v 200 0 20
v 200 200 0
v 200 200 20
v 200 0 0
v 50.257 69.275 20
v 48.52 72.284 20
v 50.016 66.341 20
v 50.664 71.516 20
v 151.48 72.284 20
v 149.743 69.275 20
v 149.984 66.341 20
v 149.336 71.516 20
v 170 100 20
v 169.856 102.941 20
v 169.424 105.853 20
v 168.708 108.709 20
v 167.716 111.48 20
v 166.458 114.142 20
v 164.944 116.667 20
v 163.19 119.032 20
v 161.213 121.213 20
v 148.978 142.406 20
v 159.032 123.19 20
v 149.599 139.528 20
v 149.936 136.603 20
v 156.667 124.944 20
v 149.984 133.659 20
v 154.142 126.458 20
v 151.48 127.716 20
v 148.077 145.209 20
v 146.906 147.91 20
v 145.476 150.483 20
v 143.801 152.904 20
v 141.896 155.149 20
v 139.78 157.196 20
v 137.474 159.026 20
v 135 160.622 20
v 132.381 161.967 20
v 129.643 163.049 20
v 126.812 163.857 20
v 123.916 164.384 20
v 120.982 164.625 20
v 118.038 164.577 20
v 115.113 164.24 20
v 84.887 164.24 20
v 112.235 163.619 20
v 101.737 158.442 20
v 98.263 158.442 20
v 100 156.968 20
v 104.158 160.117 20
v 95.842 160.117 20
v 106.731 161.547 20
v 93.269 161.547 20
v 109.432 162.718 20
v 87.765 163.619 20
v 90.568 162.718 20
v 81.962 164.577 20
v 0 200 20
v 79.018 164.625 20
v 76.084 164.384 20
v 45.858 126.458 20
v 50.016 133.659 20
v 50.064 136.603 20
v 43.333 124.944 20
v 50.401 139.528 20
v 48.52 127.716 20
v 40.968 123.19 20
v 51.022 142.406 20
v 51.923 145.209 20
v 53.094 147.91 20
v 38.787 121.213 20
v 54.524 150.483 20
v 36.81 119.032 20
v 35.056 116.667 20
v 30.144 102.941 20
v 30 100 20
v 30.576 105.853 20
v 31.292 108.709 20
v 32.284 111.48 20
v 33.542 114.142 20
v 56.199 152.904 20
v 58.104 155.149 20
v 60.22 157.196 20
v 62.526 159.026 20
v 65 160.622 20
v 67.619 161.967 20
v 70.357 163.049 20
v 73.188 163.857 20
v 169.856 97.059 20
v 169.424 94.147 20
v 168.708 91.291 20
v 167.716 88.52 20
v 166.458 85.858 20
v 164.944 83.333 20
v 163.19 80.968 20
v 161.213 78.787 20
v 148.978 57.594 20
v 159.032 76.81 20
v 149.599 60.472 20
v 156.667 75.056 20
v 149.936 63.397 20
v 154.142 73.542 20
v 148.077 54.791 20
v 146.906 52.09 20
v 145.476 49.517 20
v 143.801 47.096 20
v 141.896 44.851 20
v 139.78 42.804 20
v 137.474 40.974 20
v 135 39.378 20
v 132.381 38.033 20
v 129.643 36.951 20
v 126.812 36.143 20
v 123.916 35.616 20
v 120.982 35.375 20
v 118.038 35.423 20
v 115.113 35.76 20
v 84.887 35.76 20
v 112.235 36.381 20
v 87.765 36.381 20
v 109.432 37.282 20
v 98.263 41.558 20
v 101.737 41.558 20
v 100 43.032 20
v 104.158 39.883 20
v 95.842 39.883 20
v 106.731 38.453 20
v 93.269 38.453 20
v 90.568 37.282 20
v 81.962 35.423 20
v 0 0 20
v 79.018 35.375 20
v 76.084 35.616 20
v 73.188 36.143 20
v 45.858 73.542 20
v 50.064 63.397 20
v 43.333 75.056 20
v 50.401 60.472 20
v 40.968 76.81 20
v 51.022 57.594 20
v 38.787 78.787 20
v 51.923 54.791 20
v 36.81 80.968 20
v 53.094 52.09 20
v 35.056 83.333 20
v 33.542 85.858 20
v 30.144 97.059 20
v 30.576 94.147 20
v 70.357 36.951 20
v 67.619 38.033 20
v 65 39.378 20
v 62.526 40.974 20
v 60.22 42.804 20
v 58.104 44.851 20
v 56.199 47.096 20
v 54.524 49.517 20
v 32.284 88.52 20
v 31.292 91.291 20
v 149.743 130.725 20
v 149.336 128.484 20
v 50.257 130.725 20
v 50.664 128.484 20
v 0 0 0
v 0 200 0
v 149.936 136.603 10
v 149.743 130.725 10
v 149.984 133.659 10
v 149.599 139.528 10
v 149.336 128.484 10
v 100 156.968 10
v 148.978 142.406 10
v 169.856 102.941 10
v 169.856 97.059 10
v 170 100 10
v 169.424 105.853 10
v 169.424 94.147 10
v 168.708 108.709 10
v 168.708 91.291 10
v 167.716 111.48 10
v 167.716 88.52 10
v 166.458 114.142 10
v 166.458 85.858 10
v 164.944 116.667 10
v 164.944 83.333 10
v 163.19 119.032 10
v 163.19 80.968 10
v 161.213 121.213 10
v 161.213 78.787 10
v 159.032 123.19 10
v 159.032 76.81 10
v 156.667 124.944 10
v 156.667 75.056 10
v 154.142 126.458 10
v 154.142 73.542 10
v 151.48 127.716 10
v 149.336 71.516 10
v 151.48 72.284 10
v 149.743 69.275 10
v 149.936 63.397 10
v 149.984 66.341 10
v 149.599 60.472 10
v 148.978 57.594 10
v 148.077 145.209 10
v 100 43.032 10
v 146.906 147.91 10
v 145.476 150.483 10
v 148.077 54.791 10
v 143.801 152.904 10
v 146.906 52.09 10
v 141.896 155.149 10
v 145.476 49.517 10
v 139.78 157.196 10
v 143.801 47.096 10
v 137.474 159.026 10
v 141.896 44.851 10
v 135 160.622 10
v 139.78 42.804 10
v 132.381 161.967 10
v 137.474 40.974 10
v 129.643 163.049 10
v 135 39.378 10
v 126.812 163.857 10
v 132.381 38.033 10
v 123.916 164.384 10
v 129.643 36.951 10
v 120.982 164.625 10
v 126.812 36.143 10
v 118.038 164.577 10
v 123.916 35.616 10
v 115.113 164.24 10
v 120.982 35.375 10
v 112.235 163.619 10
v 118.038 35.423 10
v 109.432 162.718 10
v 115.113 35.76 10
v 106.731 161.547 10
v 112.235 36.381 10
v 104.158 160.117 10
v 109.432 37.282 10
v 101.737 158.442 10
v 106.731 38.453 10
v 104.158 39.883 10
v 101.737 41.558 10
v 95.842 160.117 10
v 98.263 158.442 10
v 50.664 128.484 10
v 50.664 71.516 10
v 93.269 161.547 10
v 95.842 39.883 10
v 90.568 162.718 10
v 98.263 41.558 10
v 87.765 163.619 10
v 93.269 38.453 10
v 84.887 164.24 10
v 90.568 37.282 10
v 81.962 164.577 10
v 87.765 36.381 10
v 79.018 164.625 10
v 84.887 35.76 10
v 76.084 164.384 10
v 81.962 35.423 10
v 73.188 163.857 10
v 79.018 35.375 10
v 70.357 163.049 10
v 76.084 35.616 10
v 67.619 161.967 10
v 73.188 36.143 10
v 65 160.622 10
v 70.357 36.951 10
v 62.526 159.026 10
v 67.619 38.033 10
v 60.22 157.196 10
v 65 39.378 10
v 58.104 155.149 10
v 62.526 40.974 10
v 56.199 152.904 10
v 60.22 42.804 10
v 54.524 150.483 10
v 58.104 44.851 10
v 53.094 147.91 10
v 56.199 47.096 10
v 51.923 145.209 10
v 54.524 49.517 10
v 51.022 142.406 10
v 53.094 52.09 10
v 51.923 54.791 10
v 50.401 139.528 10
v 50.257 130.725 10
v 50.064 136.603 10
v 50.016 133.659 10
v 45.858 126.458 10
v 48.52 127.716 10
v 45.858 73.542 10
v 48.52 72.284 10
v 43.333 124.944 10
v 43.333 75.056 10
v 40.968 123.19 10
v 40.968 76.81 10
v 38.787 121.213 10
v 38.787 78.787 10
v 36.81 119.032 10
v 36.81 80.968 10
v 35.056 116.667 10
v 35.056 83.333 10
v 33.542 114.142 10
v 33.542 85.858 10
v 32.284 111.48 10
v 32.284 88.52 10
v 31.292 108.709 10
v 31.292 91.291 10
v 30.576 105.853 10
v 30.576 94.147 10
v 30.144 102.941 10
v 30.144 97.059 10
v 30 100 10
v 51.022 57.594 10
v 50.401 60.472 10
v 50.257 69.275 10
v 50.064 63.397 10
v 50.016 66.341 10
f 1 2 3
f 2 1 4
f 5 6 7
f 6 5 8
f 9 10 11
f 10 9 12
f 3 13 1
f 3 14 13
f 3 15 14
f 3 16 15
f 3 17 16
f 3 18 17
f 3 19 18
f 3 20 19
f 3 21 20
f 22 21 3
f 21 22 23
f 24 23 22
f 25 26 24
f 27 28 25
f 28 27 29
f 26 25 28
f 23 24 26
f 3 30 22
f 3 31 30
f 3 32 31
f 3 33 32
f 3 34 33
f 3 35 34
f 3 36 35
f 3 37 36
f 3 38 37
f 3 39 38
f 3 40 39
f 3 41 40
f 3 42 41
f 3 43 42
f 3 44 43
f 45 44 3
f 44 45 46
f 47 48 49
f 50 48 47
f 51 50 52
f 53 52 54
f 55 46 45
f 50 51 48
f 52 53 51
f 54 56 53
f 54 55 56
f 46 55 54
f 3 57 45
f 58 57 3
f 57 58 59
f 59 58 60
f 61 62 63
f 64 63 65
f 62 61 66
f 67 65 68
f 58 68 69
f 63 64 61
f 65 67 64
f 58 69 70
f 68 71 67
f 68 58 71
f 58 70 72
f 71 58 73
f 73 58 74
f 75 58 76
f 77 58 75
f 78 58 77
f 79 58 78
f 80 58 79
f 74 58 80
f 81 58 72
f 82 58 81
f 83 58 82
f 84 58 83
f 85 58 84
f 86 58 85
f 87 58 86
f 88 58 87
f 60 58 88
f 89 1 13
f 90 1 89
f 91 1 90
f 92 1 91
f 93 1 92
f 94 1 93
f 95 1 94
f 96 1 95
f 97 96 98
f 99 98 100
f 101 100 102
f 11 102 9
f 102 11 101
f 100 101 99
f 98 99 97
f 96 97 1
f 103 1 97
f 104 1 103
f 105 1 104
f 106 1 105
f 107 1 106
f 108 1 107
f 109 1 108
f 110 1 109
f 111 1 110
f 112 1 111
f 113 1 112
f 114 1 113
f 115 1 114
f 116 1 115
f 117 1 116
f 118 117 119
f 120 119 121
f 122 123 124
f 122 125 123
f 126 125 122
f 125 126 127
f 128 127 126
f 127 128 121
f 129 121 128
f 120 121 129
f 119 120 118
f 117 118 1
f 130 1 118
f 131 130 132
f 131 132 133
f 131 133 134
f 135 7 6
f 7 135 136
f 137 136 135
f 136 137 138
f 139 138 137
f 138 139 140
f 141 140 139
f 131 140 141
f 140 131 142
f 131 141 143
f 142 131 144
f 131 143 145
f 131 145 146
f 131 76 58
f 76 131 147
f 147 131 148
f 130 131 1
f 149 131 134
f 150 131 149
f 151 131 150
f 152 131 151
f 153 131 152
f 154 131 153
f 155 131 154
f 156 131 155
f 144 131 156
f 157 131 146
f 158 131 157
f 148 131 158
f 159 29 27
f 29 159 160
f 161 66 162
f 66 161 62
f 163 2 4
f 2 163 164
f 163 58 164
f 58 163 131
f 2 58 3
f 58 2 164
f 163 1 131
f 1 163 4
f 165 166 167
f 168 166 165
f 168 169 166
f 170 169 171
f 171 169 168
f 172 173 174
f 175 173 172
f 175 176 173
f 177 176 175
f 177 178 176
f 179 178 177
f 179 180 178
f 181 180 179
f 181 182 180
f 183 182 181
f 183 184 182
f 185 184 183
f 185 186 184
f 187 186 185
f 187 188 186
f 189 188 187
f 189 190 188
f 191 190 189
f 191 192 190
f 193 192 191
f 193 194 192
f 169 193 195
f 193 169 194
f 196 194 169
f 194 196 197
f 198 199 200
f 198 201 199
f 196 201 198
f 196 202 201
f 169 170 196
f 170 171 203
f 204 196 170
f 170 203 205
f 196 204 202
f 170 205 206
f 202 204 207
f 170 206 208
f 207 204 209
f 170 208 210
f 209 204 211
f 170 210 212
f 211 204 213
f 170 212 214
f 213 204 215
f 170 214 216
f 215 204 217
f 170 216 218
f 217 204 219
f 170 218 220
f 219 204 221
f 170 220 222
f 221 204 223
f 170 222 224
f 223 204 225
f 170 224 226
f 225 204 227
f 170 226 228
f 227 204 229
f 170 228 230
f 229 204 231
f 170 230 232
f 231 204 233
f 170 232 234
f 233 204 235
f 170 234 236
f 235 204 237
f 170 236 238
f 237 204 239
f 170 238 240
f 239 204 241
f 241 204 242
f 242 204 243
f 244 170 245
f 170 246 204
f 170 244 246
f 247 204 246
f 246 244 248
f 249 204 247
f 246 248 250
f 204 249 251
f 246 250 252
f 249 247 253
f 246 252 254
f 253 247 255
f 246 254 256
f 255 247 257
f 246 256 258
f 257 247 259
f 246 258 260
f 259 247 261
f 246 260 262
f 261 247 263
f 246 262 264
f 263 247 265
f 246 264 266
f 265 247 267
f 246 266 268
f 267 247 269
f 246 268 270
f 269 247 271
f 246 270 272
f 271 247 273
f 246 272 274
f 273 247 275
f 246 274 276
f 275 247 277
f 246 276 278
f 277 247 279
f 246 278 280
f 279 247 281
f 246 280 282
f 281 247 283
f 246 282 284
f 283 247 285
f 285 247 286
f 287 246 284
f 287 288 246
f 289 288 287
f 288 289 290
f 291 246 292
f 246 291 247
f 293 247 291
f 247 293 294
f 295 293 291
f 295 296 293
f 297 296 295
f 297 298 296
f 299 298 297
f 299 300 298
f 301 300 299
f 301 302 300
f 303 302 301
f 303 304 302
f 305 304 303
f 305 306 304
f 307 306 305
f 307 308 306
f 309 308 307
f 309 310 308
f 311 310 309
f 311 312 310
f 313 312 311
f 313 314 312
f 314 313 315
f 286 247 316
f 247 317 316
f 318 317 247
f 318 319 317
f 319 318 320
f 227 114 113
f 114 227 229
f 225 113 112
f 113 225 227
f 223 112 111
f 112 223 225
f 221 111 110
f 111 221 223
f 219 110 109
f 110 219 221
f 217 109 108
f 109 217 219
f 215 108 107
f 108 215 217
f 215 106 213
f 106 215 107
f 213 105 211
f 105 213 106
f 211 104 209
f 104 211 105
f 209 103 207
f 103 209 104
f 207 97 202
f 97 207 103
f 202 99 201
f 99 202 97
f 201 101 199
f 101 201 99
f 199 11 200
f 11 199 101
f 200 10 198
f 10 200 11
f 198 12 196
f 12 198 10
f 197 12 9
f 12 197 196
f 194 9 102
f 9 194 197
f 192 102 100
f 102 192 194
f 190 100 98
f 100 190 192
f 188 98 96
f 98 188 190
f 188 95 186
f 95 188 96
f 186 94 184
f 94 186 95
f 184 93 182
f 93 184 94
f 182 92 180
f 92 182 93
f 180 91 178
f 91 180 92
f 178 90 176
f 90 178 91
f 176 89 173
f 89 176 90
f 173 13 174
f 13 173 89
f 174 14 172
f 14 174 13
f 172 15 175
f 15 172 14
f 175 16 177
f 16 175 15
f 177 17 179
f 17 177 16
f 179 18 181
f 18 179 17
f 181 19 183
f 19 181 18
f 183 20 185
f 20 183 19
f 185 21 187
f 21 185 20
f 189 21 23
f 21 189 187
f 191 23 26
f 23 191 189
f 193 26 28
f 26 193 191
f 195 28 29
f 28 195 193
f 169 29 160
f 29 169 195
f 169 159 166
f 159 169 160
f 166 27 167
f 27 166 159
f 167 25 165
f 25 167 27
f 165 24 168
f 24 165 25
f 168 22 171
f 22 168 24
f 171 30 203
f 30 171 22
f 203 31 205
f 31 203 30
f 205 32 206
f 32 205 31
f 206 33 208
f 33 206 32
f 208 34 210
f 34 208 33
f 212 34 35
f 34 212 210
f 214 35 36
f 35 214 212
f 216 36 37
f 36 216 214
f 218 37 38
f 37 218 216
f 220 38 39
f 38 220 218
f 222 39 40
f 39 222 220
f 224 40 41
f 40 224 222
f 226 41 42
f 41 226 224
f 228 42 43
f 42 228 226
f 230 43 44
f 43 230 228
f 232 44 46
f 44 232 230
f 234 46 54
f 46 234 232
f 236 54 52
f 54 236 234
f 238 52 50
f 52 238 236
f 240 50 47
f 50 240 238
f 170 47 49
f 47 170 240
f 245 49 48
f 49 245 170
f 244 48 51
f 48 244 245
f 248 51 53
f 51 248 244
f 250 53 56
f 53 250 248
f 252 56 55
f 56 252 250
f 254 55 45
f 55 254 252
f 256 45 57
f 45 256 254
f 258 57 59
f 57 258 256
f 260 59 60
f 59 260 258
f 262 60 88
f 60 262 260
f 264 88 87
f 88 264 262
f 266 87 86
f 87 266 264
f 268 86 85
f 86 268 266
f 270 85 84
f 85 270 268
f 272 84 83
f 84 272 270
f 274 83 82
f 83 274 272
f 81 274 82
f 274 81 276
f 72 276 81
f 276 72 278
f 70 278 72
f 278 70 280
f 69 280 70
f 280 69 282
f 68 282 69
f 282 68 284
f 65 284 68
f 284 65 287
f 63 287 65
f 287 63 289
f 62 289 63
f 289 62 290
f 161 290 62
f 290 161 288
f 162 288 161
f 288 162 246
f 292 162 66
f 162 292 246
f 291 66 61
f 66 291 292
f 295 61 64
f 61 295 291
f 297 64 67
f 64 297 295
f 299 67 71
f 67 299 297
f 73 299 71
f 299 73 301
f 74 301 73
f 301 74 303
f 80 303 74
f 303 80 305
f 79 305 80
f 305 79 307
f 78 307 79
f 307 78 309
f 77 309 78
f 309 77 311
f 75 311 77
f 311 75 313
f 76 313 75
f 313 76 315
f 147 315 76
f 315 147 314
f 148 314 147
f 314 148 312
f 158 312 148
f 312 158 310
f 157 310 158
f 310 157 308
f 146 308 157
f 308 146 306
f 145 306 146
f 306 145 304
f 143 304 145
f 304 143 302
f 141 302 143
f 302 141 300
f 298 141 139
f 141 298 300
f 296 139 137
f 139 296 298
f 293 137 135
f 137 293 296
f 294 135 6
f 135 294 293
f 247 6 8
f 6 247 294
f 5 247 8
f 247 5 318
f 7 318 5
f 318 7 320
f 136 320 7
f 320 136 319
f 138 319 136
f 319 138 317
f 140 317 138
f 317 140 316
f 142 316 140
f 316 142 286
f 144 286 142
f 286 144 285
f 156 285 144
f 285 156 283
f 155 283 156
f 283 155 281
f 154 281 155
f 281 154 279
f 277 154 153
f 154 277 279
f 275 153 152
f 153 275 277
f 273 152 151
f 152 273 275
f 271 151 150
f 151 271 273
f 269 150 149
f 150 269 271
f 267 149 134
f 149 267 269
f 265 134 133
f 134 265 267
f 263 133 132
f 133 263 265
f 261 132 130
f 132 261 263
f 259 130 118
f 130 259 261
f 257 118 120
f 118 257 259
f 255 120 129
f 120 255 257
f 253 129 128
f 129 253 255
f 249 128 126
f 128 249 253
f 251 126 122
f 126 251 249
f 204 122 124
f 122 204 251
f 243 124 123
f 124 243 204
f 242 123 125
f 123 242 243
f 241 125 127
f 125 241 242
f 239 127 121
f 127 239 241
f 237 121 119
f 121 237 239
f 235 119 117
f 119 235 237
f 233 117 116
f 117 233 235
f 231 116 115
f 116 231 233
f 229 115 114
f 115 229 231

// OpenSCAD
// === UNITS ===
// units: mm (the sketch is annotated "200 MM"; all values below are millimetres)

// === SKETCH TRANSCRIPTION ===
//   "200 MM" (top dimension line) -> overall stock size along X -> stock_x
//   "200" (right dimension line, mm implied) -> overall stock size along Y -> stock_y
//   outer flower outline -> pocket rim in plan -> lobe_n / lobe_dist / lobe_r / pocket_hub_r
//   inner flower outline (boundary of the hatch) -> pocket floor edge, i.e. the rim
//     offset inward by the cutter radius -> tool_d
//   hatched area, leader line "pocket" -> freeform (flower-shaped) pocket cut from
//     the top face -> pocket_depth
//   no side view / no section view -> thickness and pocket depth not given

// === PARAMETERS ===
stock_x             = 200;            // overall stock length along X, mm
stock_y             = 200;            // overall stock width along Y, mm
stock_z             = 20;             // stock thickness, mm   // TODO: verify - no section view
eps                 = 0.1;            // cutter overshoot, mm
tool_d              = 6.35;           // assumed 1/4 in end mill, mm
min_inside_corner_r = tool_d / 2;     // smallest millable inside corner, mm
min_wall            = 6;              // minimum wall between feature and edge, mm
flower_cx           = stock_x / 2;    // flower pocket centre X, mm
flower_cy           = stock_y / 2;    // flower pocket centre Y, mm
lobe_n              = 6;              // number of petals of the flower pocket
lobe_dist           = 40;             // petal centre distance from pocket centre, mm
lobe_r              = 30;             // petal radius, mm
pocket_hub_r        = 30;             // centre hub radius of the flower pocket, mm
pocket_r_out        = lobe_dist + lobe_r;   // pocket outer radius (centre to petal tip), mm
pocket_depth        = stock_z * 0.5;  // pocket depth from top face, mm  // TODO: verify - unreadable on sketch

// === ASSUMPTIONS ===
// - Units are mm: the sketch carries an explicit "MM" on the horizontal dimension.
// - No section view is drawn, so stock thickness is assumed to be a typical 20 mm
//   for a serving board.                                   // TODO: verify
// - Pocket depth is not dimensioned; the machining default of 0.5 * stock_z
//   (10 mm) is used.                                       // TODO: verify
// - The flower is drawn freehand and slightly irregular; it is modelled as a
//   symmetric 6-petal flower (6 circles of r = 30 mm, centres 40 mm from the
//   pocket centre, unioned with a 30 mm hub). Petal count and size are estimated
//   from the drawing relative to the 200 mm square.        // TODO: verify
// - The sketch shows a double outline: the outer line is read as the pocket rim
//   and the inner line (edge of the hatching) as the floor edge left by the
//   6.35 mm cutter, NOT as a second feature. One pocket only.
// - The pointed lobe at the bottom of the sketch is modelled as an ordinary round
//   petal; no separate stem/handle is drawn, so none is modelled.
// - The square corners are drawn sharp -> left sharp (no corner_r).
// - The flower is assumed centred in the square stock.
// - No juice groove, slot or hanging hole is drawn -> none modelled.
// - min_inside_corner_r is only used as a limit check; the pocket outline is
//   made of large arcs, so no corner has to be falsified to the tool radius.

// === MODEL ===
$fn = 64;

module flower_profile() {
    union() {
        circle(r = pocket_hub_r);
        for (i = [0 : lobe_n - 1])
            rotate([0, 0, i * 360 / lobe_n])
                translate([lobe_dist, 0])
                    circle(r = lobe_r);
    }
}

module pocket_cut() {
    translate([flower_cx, flower_cy, stock_z - pocket_depth])
        linear_extrude(height = pocket_depth + eps)
            flower_profile();
}

module board() {
    difference() {
        cube([stock_x, stock_y, stock_z]);
        pocket_cut();
    }
}

board();

// === CHECKS ===
// - Pocket footprint X: 100 +/- 70 = 30 .. 170 inside 0 .. 200 -> OK
// - Pocket footprint Y: 100 +/- 70 = 30 .. 170 inside 0 .. 200 -> OK
// - Wall pocket rim to nearest stock edge = stock_x/2 - pocket_r_out = 30 mm
//   >= min_wall (6 mm) -> OK
// - Blind pocket: floor left = stock_z - pocket_depth = 10 mm = 50 % of stock_z
//   >= 30 % of stock_z (6 mm) -> OK
// - Pocket depth 10 mm <= 0.7 * stock_z (14 mm) -> OK
// - Inside corners: every pocket boundary curve is a circle arc of r = 30 mm or a
//   > 30 mm concave blend, both well above min_inside_corner_r (3.18 mm) -> OK
// - No neighbouring features, so no feature-to-feature wall to check -> OK
// - Cutter reaches the floor everywhere in the pocket (pocket is convex enough
//   at every lobe, hub is r = 30 mm > tool_d/2) -> OK
